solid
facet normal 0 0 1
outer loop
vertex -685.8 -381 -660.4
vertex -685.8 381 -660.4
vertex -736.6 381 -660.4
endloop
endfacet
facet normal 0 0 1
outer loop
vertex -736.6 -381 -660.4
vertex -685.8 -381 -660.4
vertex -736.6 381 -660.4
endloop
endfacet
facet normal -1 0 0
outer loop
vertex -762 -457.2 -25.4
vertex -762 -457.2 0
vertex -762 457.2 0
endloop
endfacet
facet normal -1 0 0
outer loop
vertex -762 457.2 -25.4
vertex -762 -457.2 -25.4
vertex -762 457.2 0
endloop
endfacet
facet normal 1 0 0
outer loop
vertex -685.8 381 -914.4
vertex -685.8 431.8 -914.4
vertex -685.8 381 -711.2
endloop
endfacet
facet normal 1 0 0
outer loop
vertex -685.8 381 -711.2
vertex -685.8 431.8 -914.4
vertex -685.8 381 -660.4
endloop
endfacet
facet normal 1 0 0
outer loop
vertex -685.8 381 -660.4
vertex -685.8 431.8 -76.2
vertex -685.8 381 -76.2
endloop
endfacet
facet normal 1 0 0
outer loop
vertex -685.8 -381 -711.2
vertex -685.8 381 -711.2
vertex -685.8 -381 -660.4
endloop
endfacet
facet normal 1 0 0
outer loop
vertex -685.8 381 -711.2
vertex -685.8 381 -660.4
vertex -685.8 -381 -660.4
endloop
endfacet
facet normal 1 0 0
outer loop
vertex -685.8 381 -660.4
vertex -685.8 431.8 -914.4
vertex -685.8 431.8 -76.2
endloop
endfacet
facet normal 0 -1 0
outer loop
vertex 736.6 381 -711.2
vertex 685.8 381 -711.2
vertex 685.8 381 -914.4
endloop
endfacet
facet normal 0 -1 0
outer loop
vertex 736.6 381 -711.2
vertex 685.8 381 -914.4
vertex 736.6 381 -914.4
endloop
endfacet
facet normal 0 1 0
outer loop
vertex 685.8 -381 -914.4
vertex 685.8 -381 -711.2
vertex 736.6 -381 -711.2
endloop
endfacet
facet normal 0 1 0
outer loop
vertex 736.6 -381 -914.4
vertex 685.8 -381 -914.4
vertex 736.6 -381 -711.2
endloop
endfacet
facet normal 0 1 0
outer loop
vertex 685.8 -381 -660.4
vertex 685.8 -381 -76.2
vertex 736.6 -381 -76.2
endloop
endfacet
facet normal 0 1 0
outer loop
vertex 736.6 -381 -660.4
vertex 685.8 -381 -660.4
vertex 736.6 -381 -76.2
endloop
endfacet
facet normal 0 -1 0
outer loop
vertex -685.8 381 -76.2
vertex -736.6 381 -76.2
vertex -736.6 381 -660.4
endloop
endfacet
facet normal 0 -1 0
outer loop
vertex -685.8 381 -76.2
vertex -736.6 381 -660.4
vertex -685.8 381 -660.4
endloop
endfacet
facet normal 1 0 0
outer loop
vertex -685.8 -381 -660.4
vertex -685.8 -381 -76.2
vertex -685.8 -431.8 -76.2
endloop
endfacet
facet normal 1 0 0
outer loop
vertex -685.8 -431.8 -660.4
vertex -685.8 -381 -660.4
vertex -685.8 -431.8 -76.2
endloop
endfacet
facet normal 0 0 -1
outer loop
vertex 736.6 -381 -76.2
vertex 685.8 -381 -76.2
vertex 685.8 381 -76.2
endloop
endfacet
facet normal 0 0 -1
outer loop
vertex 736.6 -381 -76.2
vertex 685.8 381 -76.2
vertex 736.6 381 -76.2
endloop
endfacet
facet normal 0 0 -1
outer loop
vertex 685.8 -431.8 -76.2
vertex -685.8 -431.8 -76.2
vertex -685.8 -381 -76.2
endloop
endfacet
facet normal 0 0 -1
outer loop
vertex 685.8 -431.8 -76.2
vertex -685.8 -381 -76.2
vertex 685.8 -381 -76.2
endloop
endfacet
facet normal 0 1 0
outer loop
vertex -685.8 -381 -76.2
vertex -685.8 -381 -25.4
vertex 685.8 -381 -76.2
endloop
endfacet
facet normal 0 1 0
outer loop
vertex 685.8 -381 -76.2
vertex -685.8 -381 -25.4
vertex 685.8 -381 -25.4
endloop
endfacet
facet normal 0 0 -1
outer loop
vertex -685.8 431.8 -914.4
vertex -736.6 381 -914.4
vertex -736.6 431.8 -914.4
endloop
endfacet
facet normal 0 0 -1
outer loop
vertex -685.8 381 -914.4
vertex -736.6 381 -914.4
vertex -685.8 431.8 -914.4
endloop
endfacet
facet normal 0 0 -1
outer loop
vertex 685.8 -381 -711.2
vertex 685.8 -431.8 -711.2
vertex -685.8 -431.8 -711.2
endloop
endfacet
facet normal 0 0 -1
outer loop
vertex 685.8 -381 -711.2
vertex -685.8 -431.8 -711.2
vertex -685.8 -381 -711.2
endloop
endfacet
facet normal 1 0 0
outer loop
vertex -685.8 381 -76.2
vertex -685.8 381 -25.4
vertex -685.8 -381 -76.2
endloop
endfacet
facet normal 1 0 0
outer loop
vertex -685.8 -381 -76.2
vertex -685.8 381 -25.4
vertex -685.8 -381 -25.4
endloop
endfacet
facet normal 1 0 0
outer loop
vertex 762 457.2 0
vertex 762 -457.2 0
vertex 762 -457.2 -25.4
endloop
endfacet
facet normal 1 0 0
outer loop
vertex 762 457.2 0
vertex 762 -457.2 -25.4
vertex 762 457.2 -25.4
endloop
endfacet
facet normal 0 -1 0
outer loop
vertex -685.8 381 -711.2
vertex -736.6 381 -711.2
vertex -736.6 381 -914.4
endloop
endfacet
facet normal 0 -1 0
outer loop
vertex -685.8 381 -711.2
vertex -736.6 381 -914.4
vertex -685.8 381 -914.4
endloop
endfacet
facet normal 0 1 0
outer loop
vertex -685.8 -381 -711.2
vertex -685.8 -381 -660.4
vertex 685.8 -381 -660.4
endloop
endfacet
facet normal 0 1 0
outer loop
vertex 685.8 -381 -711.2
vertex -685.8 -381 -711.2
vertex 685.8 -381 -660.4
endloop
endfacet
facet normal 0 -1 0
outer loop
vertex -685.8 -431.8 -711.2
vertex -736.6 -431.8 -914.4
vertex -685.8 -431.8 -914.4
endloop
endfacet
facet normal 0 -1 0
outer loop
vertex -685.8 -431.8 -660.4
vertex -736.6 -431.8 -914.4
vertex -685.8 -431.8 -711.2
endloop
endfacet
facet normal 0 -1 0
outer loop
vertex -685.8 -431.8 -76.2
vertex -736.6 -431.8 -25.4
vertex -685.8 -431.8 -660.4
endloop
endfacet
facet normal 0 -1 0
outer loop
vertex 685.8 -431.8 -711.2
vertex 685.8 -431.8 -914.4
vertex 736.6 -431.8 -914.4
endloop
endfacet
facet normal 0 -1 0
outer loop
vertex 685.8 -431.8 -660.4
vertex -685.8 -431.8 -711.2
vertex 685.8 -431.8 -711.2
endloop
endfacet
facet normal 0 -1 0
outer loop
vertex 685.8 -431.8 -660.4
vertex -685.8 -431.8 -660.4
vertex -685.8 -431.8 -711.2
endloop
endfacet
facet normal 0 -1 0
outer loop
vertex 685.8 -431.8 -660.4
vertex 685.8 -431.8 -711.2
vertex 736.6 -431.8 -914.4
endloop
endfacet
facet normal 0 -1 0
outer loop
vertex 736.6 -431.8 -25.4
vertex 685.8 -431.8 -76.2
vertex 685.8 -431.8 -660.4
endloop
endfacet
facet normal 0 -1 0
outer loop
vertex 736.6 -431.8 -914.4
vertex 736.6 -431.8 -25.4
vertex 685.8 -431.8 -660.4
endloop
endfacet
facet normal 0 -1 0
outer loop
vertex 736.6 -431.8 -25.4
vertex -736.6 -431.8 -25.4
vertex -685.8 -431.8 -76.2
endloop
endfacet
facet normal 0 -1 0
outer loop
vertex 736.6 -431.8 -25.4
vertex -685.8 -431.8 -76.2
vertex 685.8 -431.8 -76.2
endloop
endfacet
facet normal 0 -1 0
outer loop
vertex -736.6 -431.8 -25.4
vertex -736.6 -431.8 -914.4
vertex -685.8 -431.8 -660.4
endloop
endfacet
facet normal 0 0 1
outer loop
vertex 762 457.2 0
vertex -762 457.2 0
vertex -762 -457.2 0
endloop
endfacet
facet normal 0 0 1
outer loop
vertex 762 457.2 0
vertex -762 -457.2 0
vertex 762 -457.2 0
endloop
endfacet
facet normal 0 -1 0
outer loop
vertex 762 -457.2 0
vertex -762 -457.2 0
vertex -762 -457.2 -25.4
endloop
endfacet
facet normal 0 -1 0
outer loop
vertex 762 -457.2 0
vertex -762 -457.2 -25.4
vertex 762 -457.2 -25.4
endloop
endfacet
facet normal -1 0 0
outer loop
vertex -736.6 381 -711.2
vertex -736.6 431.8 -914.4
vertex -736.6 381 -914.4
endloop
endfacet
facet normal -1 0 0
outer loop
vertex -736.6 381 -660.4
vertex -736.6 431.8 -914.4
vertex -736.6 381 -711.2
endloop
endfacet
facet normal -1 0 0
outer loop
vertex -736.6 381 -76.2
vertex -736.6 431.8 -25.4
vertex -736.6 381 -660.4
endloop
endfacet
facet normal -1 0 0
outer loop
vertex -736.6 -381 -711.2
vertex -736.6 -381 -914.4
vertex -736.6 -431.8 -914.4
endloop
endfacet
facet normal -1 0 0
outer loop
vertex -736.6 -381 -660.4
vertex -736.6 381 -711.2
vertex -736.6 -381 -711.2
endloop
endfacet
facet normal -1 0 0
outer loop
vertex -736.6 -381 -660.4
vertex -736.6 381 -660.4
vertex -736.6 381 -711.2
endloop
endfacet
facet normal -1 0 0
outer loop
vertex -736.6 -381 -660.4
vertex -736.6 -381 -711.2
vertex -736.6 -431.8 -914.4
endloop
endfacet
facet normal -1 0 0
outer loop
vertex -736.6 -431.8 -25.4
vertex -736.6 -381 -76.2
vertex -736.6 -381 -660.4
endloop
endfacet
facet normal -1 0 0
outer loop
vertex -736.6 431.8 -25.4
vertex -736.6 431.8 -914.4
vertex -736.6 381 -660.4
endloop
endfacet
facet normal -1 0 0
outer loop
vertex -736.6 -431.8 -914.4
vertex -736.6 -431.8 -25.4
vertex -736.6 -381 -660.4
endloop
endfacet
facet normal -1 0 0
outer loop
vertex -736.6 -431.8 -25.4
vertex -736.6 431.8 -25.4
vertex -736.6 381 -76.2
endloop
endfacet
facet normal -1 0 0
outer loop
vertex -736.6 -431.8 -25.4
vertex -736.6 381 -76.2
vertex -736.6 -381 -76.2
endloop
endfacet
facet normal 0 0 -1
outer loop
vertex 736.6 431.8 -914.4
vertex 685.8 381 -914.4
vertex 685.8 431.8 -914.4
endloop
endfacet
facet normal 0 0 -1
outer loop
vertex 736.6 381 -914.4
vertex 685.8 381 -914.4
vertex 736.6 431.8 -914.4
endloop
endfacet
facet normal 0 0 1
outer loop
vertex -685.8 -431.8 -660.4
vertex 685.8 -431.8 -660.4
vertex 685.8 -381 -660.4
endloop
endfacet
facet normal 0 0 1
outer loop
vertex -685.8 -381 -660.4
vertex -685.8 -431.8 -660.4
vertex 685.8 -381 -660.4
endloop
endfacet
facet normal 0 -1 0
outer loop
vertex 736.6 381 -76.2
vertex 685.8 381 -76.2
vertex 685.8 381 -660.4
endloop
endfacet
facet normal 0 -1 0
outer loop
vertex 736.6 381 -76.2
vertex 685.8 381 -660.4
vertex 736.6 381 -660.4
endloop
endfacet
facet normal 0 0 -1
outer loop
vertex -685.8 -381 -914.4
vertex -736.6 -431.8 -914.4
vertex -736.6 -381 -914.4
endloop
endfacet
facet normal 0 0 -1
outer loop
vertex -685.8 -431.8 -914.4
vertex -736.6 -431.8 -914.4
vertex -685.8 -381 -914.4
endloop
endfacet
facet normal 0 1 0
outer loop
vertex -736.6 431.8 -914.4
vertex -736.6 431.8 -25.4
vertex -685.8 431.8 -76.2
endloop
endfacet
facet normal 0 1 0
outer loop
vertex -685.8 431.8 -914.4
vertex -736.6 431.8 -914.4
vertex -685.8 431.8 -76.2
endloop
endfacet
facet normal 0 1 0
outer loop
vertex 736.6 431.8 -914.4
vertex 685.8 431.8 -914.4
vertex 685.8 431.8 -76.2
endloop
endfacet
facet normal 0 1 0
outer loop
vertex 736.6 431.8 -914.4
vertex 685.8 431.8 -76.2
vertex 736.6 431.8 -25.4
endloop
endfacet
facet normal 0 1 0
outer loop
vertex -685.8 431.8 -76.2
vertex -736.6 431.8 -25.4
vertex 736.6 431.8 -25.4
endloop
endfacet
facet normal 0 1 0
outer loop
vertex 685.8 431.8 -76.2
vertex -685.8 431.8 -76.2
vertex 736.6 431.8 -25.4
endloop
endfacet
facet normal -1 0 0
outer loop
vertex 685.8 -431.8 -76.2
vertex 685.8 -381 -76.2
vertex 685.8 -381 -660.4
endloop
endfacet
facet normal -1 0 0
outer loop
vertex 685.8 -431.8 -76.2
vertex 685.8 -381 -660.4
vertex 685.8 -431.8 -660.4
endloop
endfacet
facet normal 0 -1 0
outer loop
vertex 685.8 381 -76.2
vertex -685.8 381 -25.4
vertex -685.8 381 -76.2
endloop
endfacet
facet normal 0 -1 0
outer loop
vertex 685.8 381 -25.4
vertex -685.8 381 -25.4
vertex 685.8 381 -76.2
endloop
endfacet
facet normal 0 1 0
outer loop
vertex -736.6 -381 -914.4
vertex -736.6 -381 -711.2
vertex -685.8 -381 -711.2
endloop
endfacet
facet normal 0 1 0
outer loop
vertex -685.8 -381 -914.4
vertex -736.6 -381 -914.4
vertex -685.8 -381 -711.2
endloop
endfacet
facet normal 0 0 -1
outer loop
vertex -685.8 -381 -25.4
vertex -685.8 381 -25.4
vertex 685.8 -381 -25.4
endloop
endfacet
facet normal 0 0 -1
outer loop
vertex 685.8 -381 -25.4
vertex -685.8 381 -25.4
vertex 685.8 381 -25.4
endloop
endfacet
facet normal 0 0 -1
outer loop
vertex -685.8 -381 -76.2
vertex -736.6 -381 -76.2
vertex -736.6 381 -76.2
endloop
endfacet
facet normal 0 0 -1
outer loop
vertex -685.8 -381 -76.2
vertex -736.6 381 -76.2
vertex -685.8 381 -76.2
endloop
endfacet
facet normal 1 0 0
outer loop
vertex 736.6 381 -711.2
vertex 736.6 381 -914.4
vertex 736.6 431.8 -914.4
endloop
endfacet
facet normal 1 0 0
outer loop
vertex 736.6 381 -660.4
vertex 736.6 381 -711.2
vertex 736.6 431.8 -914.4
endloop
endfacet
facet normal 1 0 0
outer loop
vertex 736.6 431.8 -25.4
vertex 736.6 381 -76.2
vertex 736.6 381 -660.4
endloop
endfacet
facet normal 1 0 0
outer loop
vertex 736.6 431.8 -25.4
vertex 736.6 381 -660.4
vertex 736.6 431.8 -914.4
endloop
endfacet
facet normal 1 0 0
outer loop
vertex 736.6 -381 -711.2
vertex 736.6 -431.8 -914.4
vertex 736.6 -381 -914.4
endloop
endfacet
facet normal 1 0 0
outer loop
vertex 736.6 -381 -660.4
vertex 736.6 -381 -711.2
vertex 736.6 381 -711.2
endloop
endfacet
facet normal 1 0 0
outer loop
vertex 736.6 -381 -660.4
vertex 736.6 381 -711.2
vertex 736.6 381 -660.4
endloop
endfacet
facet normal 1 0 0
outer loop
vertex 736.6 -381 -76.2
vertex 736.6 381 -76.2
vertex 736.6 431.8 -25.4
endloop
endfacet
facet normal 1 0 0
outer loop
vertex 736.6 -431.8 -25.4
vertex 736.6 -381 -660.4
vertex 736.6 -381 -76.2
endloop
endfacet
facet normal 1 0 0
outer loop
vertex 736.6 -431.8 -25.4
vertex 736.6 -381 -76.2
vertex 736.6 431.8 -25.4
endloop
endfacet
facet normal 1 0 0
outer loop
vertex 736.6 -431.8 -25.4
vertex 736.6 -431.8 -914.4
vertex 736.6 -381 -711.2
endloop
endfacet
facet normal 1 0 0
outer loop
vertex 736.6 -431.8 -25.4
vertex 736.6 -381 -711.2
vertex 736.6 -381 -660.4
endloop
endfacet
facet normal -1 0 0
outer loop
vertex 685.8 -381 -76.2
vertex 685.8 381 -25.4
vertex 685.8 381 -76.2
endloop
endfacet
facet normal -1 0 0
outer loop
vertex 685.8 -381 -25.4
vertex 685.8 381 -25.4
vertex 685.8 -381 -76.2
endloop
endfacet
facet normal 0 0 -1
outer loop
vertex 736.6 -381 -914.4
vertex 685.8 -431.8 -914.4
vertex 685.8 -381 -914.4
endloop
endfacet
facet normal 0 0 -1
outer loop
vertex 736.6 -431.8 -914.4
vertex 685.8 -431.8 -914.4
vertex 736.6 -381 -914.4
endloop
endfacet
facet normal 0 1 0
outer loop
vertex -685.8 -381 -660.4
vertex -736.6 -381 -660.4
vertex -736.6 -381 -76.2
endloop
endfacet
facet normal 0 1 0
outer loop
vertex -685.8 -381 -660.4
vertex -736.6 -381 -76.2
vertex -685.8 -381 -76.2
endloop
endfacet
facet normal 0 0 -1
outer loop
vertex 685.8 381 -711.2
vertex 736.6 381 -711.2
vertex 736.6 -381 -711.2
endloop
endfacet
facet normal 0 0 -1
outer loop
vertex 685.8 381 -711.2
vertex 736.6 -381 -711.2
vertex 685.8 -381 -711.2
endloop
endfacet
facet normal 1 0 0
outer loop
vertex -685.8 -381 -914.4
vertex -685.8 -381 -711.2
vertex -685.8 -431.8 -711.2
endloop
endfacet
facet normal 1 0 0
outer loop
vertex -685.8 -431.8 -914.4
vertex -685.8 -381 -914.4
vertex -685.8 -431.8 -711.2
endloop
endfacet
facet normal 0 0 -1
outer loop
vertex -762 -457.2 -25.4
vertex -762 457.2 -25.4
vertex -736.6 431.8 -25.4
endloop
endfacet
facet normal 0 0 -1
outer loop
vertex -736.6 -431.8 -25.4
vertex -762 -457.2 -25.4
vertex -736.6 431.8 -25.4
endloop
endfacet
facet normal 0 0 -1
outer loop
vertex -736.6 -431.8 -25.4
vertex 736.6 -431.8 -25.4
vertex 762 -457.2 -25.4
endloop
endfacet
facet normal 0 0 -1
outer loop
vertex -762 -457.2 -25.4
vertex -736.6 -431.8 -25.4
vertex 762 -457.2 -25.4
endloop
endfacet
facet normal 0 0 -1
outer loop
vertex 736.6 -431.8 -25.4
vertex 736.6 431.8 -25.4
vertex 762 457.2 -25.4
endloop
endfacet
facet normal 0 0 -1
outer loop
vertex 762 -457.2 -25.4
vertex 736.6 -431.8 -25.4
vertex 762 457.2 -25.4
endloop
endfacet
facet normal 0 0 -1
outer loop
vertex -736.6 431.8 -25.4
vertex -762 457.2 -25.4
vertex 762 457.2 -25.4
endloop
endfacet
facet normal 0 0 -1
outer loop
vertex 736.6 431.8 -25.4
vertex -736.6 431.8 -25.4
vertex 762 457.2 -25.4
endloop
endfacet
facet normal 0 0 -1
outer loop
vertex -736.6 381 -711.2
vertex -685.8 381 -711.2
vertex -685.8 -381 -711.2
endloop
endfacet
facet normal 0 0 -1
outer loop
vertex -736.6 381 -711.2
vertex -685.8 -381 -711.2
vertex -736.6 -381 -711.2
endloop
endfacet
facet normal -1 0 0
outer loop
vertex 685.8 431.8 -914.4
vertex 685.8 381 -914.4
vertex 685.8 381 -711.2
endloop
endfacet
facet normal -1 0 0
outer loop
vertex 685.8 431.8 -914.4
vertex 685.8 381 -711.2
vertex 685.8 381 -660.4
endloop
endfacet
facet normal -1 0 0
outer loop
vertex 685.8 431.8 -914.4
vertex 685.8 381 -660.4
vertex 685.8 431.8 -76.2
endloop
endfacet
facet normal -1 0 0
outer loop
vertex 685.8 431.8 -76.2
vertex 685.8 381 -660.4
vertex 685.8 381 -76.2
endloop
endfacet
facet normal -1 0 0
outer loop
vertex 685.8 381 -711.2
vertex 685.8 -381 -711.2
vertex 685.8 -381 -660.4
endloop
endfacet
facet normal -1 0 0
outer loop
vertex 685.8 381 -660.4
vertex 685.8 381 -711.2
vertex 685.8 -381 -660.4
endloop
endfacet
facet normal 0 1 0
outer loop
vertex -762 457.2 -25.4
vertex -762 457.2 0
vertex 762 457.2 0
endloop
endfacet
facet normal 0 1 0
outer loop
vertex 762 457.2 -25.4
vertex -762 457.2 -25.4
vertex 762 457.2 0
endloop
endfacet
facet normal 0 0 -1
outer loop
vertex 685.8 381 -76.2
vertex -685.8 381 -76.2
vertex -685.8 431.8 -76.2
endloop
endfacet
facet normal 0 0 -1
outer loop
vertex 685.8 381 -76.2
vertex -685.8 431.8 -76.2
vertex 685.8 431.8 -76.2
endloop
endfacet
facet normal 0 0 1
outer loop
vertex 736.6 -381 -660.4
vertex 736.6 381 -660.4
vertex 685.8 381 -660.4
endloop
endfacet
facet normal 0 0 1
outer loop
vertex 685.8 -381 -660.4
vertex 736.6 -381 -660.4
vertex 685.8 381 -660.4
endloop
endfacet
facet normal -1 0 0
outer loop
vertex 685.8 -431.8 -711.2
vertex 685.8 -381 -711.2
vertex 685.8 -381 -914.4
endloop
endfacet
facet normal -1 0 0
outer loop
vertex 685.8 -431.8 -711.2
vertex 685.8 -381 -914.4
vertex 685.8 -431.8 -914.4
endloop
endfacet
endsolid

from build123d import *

# Parameters (mm, degrees)
F0_W     = 1524
F0_H     = 914.4
F1_DEPTH = 25.4
F2_W     = 1473.2
F2_H     = 863.6
F2_W_2   = 1371.6
F2_H_2   = 762
F3_DEPTH = 50.8
F4_W     = 50.8
F4_H     = 50.8
F5_DEPTH = 838.2
F6_W     = 50.8
F6_H     = 50.8
F7_DEPTH = 1371.6
F8_W     = 50.8
F8_H     = 50.8
F9_DEPTH = 762


with BuildPart() as f1:
    # F0 (on Top) → F1 (new body)
    with BuildSketch(Plane.XY):
        Rectangle(F0_W, F0_H)
    extrude(amount=-F1_DEPTH)

    # F2 (on face) → F3 (join)
    with BuildSketch(Plane(origin=(0, 0, -25.4), x_dir=(1, 0, 0), z_dir=(0, 0, -1))):
        Rectangle(F2_W, F2_H)
        Rectangle(F2_W_2, F2_H_2, mode=Mode.SUBTRACT)
    extrude(amount=F3_DEPTH)

    # F4 (on face) → F5 (join)
    with BuildSketch(Plane(origin=(0, 0, -76.2), x_dir=(1, 0, 0), z_dir=(0, 0, -1))):
        with Locations((711.2, 406.4)):
            Rectangle(F4_W, F4_H)
        with Locations((711.2, -406.4)):
            Rectangle(F4_W, F4_H)
        with Locations((-711.2, -406.4)):
            Rectangle(F4_W, F4_H)
        with Locations((-711.2, 406.4)):
            Rectangle(F4_W, F4_H)
    extrude(amount=F5_DEPTH)

    # F6 (on face) → F7 (join, through all)
    with BuildSketch(Plane.YZ.offset(-685.8)):
        with Locations((-406.4, -685.8)):
            Rectangle(F6_W, F6_H)
    extrude(amount=F7_DEPTH)

    # F8 (on face) → F9 (join, through all)
    with BuildSketch(Plane(origin=(0, -381, 0), x_dir=(-1, 0, 0), z_dir=(0, 1, 0))):
        with Locations((-711.2, -685.8)):
            Rectangle(F8_W, F8_H)
        with Locations((711.2, -685.8)):
            Rectangle(F8_W, F8_H)
    extrude(amount=F9_DEPTH)


solid = f1.part
